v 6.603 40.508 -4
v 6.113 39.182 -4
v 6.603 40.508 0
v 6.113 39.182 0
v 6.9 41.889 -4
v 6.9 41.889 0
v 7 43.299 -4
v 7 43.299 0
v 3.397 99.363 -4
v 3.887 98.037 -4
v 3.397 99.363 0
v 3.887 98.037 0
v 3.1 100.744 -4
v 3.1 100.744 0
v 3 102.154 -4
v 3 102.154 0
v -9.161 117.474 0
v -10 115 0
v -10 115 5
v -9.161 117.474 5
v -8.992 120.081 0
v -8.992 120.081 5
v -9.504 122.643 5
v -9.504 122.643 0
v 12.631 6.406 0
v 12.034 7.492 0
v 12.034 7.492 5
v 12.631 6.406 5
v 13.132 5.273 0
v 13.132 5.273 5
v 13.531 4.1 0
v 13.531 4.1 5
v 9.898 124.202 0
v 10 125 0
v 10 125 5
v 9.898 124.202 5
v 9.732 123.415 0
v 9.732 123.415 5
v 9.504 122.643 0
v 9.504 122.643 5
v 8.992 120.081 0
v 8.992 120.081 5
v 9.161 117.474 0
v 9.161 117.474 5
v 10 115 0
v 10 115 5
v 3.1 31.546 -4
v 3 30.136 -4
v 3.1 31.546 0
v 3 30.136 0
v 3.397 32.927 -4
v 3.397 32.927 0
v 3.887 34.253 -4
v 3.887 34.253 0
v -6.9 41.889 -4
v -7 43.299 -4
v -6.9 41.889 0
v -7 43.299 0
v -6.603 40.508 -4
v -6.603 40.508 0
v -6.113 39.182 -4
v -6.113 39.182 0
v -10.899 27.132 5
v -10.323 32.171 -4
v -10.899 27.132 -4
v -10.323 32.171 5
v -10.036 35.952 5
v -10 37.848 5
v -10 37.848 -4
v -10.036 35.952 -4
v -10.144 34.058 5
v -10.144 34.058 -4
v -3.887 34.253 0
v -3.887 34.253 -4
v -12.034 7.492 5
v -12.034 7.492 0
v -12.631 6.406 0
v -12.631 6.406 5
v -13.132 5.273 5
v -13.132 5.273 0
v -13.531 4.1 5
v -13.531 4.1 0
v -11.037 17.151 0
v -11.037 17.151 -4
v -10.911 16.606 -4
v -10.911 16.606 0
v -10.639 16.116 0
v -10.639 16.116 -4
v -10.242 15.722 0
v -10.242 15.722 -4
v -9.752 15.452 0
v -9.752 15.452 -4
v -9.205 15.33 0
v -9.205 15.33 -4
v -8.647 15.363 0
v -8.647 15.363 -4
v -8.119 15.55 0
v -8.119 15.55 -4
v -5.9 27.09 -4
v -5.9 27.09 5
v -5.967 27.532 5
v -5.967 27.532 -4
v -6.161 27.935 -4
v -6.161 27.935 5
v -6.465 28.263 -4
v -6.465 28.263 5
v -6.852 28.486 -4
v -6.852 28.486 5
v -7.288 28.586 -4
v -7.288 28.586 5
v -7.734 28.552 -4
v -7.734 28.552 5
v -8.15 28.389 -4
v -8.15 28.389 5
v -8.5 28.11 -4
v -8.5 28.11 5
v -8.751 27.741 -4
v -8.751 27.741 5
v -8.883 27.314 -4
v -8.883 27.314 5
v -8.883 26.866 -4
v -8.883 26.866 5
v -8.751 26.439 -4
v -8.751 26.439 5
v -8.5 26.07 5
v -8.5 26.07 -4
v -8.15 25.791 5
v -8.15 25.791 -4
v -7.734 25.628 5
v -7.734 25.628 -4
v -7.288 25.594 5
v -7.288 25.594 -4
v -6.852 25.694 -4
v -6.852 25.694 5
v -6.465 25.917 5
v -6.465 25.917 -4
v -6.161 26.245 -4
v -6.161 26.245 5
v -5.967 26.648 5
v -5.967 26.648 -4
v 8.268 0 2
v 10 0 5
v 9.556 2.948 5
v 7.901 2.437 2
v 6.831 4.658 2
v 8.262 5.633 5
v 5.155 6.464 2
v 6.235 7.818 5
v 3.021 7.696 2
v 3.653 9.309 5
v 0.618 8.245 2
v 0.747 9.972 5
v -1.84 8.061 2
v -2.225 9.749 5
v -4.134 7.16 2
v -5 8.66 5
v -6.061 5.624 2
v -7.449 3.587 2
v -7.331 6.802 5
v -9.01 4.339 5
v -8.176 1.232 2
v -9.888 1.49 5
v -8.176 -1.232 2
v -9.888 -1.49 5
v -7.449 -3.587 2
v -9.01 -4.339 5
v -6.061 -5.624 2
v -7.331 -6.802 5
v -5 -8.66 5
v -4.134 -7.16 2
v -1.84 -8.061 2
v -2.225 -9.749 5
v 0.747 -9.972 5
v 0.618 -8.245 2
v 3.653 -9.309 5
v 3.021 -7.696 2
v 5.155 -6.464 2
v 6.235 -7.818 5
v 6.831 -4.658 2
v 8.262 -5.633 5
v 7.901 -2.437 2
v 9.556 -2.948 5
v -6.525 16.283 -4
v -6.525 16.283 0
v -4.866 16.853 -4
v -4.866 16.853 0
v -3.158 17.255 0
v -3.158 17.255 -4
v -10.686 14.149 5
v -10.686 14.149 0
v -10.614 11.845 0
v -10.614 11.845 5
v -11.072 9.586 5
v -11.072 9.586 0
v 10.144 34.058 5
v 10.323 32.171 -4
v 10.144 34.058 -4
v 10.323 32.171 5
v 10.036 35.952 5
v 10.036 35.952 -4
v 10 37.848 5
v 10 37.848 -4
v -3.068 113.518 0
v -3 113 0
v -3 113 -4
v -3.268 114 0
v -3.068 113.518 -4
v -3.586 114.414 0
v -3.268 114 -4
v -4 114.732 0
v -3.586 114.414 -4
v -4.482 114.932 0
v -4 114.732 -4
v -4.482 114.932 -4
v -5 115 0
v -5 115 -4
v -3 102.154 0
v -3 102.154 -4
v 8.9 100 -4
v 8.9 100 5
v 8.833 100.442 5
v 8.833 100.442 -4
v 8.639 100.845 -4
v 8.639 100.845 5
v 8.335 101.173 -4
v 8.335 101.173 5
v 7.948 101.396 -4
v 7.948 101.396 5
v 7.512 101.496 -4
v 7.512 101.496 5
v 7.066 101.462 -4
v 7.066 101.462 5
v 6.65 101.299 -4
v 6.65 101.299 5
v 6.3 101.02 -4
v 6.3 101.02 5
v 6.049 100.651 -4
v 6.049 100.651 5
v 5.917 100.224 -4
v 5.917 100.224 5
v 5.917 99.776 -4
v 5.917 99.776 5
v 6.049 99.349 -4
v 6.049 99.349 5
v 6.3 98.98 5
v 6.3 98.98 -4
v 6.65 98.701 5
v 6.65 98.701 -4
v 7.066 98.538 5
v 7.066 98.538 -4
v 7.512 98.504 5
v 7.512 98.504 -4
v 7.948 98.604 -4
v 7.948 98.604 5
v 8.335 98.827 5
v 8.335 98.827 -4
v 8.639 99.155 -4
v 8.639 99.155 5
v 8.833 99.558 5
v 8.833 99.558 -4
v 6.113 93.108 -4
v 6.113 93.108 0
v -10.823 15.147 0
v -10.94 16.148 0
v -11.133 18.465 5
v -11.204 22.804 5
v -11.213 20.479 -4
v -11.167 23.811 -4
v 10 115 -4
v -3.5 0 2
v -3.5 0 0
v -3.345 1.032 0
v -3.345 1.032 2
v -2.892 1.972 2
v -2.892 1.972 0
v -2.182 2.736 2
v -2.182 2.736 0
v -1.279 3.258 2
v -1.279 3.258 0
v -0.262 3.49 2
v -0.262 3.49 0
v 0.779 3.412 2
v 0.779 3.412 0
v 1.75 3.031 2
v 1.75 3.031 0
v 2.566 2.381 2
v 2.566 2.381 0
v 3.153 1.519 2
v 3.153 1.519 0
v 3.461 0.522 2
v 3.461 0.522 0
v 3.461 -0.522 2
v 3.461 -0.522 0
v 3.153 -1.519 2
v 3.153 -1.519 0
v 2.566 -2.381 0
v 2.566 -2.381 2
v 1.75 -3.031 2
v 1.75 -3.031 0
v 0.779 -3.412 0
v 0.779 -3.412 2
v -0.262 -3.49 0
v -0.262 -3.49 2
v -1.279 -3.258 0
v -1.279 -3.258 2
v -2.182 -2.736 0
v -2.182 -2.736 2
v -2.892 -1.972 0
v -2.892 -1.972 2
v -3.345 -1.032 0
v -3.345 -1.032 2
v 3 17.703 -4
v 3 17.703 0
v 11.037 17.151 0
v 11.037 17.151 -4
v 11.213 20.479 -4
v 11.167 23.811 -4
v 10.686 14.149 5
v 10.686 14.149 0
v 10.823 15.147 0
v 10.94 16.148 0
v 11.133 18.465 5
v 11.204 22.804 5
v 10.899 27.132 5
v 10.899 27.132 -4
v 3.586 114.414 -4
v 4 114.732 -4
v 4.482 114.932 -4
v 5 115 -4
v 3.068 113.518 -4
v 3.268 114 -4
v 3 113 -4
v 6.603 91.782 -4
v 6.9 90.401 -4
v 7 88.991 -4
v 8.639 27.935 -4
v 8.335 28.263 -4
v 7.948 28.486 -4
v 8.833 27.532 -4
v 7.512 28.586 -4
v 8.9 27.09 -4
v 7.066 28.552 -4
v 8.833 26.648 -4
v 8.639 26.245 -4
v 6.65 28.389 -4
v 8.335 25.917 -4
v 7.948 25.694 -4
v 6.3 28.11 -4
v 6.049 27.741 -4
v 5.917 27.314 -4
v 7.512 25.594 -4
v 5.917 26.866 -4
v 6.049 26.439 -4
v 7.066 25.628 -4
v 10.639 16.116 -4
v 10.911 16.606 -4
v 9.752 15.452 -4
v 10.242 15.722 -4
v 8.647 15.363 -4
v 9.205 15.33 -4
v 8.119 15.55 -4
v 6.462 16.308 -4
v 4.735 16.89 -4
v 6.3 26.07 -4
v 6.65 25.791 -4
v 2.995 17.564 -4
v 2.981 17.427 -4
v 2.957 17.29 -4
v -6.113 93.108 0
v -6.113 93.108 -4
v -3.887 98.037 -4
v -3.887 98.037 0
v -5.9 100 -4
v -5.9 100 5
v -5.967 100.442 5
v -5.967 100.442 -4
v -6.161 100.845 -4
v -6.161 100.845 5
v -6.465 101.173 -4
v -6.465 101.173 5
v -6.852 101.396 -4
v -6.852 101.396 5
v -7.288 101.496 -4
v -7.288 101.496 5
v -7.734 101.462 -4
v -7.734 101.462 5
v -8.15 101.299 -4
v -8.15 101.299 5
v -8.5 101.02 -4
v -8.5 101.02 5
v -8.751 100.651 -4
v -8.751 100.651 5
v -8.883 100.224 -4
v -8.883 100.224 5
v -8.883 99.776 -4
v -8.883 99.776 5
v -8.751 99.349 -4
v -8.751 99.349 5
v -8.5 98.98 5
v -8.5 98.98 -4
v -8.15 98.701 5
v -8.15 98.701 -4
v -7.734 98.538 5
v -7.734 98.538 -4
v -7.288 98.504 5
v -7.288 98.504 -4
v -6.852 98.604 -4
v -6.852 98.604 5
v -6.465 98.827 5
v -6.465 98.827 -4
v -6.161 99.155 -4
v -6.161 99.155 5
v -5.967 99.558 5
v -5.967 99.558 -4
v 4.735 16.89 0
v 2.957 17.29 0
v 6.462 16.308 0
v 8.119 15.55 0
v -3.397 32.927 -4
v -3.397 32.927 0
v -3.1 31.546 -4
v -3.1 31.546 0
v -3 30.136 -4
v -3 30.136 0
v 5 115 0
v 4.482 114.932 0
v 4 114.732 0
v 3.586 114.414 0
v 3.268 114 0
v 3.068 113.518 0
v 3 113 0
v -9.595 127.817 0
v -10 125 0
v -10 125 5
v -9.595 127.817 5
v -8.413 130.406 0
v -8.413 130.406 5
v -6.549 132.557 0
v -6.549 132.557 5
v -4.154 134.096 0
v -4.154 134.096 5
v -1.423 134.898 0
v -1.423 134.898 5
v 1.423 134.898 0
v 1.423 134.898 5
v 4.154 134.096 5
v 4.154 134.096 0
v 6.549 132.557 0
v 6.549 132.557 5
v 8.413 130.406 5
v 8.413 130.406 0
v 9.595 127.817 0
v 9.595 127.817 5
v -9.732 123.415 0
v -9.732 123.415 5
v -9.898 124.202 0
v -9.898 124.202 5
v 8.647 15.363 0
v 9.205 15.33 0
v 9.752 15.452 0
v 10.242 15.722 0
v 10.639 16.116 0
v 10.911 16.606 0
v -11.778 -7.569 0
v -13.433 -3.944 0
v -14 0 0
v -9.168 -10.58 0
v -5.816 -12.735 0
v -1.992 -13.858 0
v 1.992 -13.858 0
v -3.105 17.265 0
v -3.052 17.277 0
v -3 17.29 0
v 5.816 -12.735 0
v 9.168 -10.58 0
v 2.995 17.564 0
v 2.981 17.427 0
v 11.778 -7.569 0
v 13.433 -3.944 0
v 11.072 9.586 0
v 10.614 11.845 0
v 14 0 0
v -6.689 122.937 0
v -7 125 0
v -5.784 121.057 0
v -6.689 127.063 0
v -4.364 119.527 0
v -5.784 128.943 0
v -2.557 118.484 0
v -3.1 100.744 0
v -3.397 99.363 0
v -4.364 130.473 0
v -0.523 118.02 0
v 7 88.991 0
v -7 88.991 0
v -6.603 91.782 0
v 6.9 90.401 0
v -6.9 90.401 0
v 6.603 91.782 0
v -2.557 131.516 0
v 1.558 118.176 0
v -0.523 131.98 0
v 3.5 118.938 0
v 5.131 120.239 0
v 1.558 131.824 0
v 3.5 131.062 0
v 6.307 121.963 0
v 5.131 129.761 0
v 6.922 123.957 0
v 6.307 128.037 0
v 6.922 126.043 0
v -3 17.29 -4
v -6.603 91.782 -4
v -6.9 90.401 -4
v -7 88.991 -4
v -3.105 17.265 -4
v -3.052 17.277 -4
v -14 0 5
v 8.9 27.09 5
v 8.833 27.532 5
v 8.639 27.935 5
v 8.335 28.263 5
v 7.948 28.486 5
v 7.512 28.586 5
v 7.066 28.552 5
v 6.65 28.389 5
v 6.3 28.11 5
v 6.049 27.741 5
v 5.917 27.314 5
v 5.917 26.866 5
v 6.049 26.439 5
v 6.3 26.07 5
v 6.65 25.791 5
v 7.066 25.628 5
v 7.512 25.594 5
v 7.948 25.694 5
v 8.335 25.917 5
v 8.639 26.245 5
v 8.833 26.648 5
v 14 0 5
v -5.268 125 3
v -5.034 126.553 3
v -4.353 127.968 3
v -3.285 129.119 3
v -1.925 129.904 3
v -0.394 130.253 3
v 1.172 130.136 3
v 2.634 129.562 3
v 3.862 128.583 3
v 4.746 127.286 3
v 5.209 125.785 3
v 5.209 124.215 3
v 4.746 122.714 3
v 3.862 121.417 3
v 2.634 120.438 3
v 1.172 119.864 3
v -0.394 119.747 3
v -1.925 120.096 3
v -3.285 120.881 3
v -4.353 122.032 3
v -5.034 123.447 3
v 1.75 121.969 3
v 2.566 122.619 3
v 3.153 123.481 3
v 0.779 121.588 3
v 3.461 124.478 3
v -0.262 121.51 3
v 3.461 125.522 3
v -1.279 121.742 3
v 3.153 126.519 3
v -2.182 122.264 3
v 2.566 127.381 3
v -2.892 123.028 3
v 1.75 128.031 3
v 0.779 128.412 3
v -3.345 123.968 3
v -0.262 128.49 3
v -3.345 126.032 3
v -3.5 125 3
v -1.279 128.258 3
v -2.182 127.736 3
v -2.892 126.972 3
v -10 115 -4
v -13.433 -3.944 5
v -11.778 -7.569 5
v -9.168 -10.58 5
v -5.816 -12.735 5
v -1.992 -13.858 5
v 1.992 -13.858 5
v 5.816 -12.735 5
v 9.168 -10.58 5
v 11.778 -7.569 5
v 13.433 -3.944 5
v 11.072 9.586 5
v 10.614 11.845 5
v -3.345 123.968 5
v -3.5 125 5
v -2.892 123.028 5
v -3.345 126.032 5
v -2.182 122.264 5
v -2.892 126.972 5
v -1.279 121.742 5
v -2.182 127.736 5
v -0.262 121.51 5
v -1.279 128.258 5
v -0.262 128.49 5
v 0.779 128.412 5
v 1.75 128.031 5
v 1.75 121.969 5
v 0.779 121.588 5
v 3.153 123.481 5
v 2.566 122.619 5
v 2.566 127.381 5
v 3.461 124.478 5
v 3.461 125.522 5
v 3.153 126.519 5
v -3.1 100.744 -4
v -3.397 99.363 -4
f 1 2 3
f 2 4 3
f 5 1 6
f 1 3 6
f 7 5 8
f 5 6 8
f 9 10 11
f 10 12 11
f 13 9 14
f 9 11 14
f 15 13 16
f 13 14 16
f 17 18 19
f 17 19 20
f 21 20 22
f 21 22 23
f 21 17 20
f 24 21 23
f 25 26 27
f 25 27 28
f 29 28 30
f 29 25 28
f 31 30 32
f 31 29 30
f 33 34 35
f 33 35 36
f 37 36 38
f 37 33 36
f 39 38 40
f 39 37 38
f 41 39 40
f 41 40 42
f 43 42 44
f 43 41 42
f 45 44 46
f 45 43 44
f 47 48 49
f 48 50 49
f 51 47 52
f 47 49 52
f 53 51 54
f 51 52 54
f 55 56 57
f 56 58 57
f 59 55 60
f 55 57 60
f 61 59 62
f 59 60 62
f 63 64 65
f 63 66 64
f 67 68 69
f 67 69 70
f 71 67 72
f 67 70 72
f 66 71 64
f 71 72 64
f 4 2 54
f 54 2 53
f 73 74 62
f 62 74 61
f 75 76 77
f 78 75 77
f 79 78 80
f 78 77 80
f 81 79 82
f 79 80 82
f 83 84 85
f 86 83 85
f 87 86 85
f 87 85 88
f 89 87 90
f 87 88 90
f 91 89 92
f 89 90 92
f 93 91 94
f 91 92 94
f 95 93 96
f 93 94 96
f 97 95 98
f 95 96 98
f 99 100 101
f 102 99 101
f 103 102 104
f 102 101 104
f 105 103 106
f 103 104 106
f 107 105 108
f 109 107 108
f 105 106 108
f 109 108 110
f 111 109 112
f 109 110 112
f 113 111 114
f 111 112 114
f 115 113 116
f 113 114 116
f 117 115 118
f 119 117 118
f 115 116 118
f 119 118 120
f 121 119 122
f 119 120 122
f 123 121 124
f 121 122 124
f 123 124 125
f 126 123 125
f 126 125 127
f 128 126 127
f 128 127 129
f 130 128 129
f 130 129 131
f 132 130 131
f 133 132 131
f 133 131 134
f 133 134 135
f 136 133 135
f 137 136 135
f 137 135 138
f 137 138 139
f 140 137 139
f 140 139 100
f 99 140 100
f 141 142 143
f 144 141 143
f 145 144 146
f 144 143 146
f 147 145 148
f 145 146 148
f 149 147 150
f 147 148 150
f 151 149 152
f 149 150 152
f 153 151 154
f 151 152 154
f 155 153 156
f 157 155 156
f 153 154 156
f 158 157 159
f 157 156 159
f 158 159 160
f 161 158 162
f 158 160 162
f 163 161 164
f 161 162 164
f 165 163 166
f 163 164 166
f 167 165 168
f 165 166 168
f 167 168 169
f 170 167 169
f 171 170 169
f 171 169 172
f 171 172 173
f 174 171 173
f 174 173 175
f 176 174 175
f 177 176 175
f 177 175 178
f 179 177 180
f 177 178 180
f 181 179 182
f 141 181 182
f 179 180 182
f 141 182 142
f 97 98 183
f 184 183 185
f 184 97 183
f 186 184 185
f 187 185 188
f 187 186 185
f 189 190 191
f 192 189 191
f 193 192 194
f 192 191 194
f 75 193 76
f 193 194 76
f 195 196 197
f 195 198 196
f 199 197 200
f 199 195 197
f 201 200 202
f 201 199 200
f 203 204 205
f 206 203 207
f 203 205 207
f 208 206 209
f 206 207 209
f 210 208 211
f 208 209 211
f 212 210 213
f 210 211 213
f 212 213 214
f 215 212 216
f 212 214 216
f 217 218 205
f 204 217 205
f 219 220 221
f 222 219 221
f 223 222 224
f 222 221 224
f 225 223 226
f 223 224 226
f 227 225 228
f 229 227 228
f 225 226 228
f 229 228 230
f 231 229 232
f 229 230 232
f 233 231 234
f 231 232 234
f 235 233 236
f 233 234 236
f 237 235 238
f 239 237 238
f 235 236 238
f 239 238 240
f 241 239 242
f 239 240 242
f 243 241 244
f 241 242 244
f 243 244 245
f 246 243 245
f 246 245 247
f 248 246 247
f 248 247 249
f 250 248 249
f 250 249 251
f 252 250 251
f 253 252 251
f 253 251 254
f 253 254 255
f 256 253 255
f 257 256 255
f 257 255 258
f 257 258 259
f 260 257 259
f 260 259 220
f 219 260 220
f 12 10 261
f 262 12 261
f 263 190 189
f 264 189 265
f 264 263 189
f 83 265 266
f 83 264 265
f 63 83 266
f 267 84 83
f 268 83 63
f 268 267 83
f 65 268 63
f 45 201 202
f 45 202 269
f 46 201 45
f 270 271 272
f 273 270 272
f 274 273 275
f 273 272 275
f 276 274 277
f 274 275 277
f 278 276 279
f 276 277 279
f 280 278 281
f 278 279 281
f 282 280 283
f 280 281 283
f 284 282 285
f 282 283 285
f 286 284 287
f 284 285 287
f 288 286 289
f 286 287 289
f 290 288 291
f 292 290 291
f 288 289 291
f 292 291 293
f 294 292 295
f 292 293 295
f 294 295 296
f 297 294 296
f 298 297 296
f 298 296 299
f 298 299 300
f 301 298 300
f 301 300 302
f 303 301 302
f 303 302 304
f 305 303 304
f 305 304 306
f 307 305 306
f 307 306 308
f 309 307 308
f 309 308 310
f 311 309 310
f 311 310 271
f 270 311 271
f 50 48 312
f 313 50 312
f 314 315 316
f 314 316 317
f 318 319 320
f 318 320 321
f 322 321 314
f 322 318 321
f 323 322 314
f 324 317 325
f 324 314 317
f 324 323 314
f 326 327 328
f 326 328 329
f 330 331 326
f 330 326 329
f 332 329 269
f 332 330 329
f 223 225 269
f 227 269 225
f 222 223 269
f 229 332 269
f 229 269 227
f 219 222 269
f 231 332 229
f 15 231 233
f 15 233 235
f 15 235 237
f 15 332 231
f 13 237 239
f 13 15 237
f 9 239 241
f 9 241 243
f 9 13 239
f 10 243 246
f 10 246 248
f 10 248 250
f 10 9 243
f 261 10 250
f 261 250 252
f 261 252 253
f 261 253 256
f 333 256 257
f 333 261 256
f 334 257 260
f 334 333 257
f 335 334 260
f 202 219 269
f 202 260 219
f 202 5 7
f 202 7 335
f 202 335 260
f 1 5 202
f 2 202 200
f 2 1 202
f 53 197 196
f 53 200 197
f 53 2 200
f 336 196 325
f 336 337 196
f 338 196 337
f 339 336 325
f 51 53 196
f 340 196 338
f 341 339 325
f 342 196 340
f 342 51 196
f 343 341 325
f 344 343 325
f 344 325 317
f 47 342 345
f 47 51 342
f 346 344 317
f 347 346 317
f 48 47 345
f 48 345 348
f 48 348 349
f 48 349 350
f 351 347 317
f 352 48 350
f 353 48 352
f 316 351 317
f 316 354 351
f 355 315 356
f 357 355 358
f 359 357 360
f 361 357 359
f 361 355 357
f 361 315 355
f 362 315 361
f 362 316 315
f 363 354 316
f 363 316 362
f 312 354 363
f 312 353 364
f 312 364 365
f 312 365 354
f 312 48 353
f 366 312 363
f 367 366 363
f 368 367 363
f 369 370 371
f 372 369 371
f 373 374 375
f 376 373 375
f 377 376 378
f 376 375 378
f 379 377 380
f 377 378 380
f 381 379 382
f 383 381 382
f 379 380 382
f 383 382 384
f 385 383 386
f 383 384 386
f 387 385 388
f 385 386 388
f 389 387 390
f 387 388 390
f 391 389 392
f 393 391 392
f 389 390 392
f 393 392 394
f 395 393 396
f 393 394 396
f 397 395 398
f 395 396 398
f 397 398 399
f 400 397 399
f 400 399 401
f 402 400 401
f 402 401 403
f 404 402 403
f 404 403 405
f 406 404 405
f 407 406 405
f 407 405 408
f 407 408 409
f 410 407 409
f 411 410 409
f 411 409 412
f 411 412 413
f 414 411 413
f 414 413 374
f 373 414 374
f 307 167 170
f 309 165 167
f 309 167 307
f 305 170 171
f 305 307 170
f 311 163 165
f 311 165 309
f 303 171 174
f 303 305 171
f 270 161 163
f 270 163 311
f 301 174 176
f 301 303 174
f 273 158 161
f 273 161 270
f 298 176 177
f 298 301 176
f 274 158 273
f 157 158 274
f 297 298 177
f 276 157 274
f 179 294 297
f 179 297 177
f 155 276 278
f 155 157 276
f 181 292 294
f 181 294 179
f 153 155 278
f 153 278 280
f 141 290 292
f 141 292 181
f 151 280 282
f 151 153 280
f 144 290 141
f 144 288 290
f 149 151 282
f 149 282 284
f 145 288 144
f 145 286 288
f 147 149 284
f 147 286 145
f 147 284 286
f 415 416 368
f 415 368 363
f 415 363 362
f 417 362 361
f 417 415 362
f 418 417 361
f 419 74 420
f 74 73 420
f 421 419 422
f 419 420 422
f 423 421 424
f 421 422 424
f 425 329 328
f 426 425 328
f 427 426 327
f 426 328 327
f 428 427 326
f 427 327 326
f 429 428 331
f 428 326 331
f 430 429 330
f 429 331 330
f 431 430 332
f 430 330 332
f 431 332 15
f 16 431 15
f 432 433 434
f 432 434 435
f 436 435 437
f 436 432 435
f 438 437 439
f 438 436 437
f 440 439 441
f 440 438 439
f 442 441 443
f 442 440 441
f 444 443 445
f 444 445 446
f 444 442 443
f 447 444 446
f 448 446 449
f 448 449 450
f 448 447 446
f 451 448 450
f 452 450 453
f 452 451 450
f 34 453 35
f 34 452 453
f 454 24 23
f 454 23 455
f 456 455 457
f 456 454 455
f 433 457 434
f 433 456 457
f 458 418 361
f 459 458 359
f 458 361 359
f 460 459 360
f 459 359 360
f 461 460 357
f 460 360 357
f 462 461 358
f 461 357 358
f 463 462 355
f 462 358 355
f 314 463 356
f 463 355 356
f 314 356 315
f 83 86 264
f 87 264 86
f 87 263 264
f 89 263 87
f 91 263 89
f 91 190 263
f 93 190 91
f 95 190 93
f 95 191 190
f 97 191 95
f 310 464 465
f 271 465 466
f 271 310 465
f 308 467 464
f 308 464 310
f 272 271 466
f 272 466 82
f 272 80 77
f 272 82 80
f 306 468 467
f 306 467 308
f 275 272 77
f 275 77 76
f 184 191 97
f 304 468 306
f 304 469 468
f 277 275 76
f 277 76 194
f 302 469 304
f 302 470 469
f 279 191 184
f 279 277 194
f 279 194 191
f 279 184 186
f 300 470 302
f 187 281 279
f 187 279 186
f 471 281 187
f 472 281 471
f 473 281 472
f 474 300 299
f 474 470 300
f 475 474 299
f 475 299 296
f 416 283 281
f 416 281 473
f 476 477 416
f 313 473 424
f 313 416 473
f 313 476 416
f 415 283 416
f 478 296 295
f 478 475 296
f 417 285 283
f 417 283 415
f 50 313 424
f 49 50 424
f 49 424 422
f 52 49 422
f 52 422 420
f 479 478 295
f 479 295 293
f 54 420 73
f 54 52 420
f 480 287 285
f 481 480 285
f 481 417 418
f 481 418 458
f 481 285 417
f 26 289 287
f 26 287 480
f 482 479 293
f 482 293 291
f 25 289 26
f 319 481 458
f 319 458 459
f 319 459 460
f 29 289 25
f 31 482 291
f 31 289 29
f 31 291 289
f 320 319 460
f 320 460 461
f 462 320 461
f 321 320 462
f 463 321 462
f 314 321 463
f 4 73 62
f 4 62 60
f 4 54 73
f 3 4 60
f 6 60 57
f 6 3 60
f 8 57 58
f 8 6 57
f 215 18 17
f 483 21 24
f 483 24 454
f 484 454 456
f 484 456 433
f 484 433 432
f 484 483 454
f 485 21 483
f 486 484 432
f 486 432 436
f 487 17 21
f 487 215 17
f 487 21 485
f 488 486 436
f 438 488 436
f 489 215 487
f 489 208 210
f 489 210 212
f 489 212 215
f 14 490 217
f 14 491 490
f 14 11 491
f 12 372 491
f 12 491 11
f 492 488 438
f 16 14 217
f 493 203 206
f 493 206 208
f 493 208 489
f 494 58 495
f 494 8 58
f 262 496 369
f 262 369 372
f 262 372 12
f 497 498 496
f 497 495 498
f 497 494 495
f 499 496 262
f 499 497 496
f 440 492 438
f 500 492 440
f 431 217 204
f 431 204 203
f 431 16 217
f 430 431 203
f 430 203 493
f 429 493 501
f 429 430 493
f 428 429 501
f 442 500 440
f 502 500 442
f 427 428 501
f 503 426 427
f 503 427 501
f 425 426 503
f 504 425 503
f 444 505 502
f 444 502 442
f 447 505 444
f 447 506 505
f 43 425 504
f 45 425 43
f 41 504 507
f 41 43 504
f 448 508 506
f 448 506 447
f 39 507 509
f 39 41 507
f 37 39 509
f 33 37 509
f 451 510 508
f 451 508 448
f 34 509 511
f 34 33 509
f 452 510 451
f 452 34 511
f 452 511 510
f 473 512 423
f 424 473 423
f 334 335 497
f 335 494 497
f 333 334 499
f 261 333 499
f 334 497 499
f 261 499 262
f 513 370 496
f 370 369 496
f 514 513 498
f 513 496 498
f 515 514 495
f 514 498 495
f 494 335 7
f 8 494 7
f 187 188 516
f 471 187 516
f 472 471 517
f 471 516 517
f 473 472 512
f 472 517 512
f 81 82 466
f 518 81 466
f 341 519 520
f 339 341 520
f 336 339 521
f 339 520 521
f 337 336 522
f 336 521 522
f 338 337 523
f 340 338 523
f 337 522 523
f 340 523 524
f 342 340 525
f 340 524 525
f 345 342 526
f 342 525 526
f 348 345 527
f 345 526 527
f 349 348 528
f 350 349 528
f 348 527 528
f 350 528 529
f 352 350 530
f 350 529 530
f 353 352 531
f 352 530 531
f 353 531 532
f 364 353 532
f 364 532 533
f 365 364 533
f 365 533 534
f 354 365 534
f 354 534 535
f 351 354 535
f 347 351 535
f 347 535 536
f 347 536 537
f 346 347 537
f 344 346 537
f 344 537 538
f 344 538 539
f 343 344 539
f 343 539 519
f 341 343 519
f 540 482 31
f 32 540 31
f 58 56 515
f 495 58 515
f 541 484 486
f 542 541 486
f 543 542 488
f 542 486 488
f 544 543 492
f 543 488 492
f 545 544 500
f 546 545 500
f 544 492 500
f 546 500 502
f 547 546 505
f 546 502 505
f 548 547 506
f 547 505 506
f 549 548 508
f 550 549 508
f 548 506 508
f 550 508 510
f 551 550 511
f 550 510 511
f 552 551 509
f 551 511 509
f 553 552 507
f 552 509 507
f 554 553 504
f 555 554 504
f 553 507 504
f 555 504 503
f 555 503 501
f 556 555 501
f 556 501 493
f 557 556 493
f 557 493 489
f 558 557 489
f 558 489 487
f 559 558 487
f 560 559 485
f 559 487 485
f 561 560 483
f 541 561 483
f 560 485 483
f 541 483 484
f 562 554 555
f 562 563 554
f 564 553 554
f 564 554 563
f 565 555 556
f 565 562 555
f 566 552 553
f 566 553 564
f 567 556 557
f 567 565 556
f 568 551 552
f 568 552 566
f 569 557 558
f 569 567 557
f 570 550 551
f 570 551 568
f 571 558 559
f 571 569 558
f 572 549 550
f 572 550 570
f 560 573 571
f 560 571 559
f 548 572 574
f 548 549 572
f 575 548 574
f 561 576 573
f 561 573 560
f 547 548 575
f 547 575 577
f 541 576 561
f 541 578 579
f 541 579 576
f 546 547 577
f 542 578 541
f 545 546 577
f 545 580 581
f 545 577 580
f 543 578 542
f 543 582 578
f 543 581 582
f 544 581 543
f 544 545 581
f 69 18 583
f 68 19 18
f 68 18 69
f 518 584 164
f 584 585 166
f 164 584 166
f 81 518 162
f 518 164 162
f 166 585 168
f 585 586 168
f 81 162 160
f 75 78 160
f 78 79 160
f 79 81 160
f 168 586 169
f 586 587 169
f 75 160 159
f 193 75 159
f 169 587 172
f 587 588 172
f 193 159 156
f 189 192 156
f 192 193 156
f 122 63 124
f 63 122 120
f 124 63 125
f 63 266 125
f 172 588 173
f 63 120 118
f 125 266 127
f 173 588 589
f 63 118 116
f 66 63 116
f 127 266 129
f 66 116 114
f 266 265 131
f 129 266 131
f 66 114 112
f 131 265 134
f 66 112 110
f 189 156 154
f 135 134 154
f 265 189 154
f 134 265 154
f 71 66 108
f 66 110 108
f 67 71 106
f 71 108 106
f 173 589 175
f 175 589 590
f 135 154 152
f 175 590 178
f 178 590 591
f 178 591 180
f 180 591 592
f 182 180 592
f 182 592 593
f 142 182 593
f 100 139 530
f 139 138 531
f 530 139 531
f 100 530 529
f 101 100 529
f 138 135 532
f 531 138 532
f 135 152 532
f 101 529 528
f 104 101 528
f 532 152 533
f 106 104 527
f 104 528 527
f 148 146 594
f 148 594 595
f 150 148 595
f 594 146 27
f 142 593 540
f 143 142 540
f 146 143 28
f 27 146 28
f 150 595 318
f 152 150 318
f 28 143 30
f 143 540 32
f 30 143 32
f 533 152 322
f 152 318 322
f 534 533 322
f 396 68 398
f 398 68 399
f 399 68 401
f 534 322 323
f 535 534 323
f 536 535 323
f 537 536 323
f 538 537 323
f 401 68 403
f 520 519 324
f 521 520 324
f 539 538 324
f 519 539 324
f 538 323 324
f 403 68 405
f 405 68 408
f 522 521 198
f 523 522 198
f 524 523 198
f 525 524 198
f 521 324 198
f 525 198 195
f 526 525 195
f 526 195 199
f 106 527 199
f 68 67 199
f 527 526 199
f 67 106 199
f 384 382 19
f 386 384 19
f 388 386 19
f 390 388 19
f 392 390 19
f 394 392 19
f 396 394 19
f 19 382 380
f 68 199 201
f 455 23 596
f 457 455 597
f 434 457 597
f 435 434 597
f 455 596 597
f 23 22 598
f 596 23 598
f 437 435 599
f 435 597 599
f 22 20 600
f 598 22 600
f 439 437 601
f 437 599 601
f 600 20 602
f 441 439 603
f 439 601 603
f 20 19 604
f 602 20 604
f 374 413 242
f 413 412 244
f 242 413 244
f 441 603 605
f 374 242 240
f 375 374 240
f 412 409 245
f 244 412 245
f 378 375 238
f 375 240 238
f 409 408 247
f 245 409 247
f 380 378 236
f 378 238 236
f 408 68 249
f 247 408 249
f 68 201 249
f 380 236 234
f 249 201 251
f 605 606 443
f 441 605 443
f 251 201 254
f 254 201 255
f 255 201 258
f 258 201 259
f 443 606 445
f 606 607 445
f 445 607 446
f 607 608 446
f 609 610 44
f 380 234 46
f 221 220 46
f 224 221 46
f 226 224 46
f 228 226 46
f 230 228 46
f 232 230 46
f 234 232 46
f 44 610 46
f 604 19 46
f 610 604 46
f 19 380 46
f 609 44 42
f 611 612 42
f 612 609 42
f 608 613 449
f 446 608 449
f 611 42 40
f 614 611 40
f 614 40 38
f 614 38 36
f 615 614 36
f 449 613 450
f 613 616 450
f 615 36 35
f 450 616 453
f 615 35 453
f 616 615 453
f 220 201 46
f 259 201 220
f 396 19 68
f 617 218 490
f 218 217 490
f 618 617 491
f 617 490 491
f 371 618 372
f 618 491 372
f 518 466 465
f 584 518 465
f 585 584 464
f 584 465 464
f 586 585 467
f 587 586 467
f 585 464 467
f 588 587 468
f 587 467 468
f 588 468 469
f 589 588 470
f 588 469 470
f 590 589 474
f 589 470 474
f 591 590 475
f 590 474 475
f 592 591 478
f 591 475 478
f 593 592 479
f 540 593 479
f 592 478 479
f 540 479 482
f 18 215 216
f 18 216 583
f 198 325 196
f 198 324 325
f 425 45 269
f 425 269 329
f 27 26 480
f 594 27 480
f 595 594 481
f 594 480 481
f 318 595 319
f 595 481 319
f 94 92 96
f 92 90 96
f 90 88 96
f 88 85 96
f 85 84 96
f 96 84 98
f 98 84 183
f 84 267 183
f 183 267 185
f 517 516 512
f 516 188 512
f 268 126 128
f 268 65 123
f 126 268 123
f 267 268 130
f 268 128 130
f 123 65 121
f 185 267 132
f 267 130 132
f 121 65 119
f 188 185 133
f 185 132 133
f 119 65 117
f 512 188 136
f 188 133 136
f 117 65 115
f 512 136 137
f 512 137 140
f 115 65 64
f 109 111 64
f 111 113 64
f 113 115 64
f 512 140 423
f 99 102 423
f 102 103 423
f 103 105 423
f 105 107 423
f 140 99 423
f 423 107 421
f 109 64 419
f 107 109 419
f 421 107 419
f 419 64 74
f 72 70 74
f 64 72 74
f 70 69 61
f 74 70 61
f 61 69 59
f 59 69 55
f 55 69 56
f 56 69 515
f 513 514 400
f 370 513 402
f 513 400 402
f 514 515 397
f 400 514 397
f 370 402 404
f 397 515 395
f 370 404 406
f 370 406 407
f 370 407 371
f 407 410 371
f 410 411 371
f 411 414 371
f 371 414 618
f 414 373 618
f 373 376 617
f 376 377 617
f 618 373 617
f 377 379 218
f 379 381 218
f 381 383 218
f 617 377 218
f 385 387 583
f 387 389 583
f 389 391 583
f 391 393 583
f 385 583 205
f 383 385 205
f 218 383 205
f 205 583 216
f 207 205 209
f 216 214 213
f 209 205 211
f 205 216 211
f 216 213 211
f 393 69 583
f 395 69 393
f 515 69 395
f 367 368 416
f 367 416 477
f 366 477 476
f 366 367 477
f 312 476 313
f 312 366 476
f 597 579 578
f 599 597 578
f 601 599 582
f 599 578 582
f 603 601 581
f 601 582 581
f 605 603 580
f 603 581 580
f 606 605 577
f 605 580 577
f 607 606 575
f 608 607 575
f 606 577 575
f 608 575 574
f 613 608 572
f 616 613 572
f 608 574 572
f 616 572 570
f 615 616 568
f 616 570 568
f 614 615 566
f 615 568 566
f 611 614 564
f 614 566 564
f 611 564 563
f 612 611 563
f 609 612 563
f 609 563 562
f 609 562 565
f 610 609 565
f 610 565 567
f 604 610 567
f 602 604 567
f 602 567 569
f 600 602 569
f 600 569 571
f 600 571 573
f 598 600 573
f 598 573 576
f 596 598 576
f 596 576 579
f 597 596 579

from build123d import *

# Parameters (mm, degrees)
BOSS_EXTRUDE1_DEPTH = 5
SKETCH2_W           = 20
SKETCH2_H           = 90.00000000000001
BOSS_EXTRUDE2_DEPTH = 5
CUT_EXTRUDE1_DEPTH  = 5
BOSS_EXTRUDE3_DEPTH = 4
SKETCH5_R           = 3.4999999999999996
CUT_EXTRUDE2_DEPTH  = 32
SKETCH6_R           = 10
CUT_EXTRUDE3_DEPTH  = 3
CUT_EXTRUDE3_DRAFT  = -30.000000000000068
SKETCH7_R           = 1.5
SKETCH7_R_2         = 1.5000000000000018
SKETCH7_R_3         = 1.5000000000000009
CUT_EXTRUDE4_DEPTH  = 127.10313239567049
CUT_EXTRUDE5_DEPTH  = 4
FILLET1_R           = 10
FILLET2_R           = 2
FILLET3_R           = 50
FILLET4_DEPTH       = 5
FILLET4_START       = -4
FILLET4_2_DEPTH     = 4.5281
FILLET5_R           = 2
SKETCH9_R           = 10.000000000000004
BOSS_EXTRUDE4_DEPTH = 5
CUT_EXTRUDE6_DEPTH  = 136.81605207043827
FILLET6_R           = 10
SKETCH12_R          = 7.000000000000002
CUT_EXTRUDE7_DEPTH  = 3
CUT_EXTRUDE7_DRAFT  = -30.000000000000068
SKETCH13_R          = 3.500000000000001
CUT_EXTRUDE8_DEPTH  = 136.90437814875574


with BuildPart() as part:
    # Sketch1 → Boss-Extrude1 (new body)
    with BuildSketch(Plane.XY):
        with BuildLine():
            Line((-10, 35), (-14, 0))
            ThreePointArc((-14.000000000000004, 0), (5.36e-15, -14.000000000000002), (14.000000000000007, 5.39e-15))
            Line((14, 0), (13.639000805801773, 3.1587429492344796))
            Line((13.639000805801773, 3.1587429492344796), (10, 35))
            Line((10, 35), (-10, 35))
        make_face()
    extrude(amount=BOSS_EXTRUDE1_DEPTH)

    # Sketch2 → Boss-Extrude2 (add)
    with BuildSketch(Plane.XY.offset(5)):
        with Locations((-8.9e-16, 80)):
            Rectangle(SKETCH2_W, SKETCH2_H)
    extrude(amount=-BOSS_EXTRUDE2_DEPTH)

    # Sketch3 → Cut-Extrude1 (cut)
    with BuildSketch(Plane(origin=(0, 0, 0), x_dir=(-1, 0, 0), z_dir=(0, 0, -1))):
        with BuildLine():
            Line((-13.531428571428568, 4.1), (-11.714285714285717, 20.000000000000004))
            Line((-11.714285714285717, 20.000000000000004), (-10, 10.097287013661564))
            ThreePointArc((-10, 10.097287013661564), (-12.138289126679721, 7.318029611811854), (-13.531428571428568, 4.1))
        make_face()
        with BuildLine():
            Line((11.714285714285717, 20.000000000000004), (10, 10.097287013661564))
            ThreePointArc((10, 10.097287013661564), (12.13828912667972, 7.318029611811857), (13.531428571428568, 4.1))
            Line((13.531428571428568, 4.1), (11.714285714285717, 20.000000000000004))
        make_face()
    extrude(amount=-CUT_EXTRUDE1_DEPTH, mode=Mode.SUBTRACT)

    # Sketch4 → Boss-Extrude3 (add)
    with BuildSketch(Plane(origin=(0, 0, 0), x_dir=(-1, 0, 0), z_dir=(0, 0, -1))):
        with BuildLine():
            Line((11.714285714285715, 20.000000000000007), (10.663491421845874, 13.93))
            ThreePointArc((10.663491421845874, 13.93), (1.07e-15, 17.541117308183576), (-10.663491421845876, 13.93))
            Line((-10.663491421845876, 13.93), (-11.714285714285717, 20.000000000000004))
            Line((-11.714285714285717, 20.000000000000004), (-10, 35))
            Line((-10, 35), (-9.999999999999998, 115))
            Line((-9.999999999999998, 115), (9.999999999999986, 115))
            Line((9.999999999999986, 115), (10.000000000000002, 35))
            Line((10.000000000000002, 35), (11.714285714285715, 20.000000000000007))
        make_face()
    extrude(amount=BOSS_EXTRUDE3_DEPTH)

    # Sketch5 → Cut-Extrude2 (cut)
    with BuildSketch(Plane(origin=(0, 0, 0), x_dir=(-1, 0, 0), z_dir=(0, 0, -1))):
        Circle(SKETCH5_R)
    extrude(amount=-CUT_EXTRUDE2_DEPTH, mode=Mode.SUBTRACT)


with BuildPart() as cut_extrude3_tool:
    # Sketch6 → Cut-Extrude3 (with draft: the straight prism first)
    with BuildSketch(Plane.XY.offset(5)):
        Circle(SKETCH6_R)
    extrude(amount=-CUT_EXTRUDE3_DEPTH)
    # Cut-Extrude3: the draft: its side faces are tilted about the plane it starts from
    cut_extrude3_sides = [cut_extrude3_tool.faces().sort_by_distance(p)[0] for p in [
        (-10, 0, 3.5),
    ]]
    draft(cut_extrude3_sides, Plane.XY.offset(5), CUT_EXTRUDE3_DRAFT)


with BuildPart() as part_1:
    add(part.part)

    # Cut-Extrude3: cut by cut_extrude3_tool
    add(cut_extrude3_tool.part, mode=Mode.SUBTRACT)

    # Sketch7 → Cut-Extrude4 (cut, through all)
    with BuildSketch(Plane.XY.offset(5)):
        with Locations((-7.40000000000001, 27.090000000000003)):
            Circle(SKETCH7_R)
        with Locations((7.40000000000001, 27.090000000000003)):
            Circle(SKETCH7_R_2)
        with Locations((-7.4, 100)):
            Circle(SKETCH7_R)
        with Locations((7.4, 100)):
            Circle(SKETCH7_R_3)
    extrude(amount=-CUT_EXTRUDE4_DEPTH, mode=Mode.SUBTRACT)

    # Sketch8 → Cut-Extrude5 (cut)
    with BuildSketch(Plane(origin=(0, 0, -4), x_dir=(-1, 0, 0), z_dir=(0, 0, -1))):
        Polygon((3.0000000000000036, 115), (-3, 115), (-2.999999999999998, 100), (-6.999999999999996, 91.14510297951342), (-6.999999999999996, 41.14510297951343), (-2.999999999999998, 32.29020595902685), (-3, 17.290205959026846), (3.000000000000001, 17.290205959026846), (2.9999999999999987, 32.29020595902685), (6.999999999999997, 41.14510297951343), (6.999999999999999, 91.14510297951342), (3.0000000000000004, 100), align=None)
    extrude(amount=-CUT_EXTRUDE5_DEPTH, mode=Mode.SUBTRACT)

    # Fillet1
    fillet1_edges = [part_1.edges().sort_by_distance(p)[0] for p in [
        (2.999999999999998, 32.29020595902685, -2),
        (6.999999999999996, 41.14510297951343, -2),
        (6.999999999999996, 91.14510297951342, -2),
        (2.999999999999998, 100, -2),
        (-3.0000000000000004, 100, -2),
        (-6.999999999999999, 91.14510297951342, -2),
        (-6.999999999999997, 41.14510297951343, -2),
        (-2.9999999999999987, 32.29020595902685, -2),
    ]]
    fillet(fillet1_edges, radius=FILLET1_R)

    # Fillet2
    # the kernel refuses this fillet: 2 mm, written as the material it adds along each edge
    with BuildSketch(Plane(origin=(3, 17.290205959026846, -4), x_dir=(0, 1, 0), z_dir=(0, 0, 1))) as fillet2_piece_1:
        with BuildLine():
            CenterArc((0.4123469241082738, 2), FILLET2_R, 258.1017989738068, 11.898201026193192)
            Line((-3.55e-15, 0.0429690819564339), (0, 0))
            Line((0, 0), (0.4123469241082738, 0))
        make_face()
    extrude(amount=5.0308673102706845)
    # the kernel refuses this fillet: 2 mm, written as the material it takes off along each edge
    with BuildSketch(Plane(origin=(-2.957030918043564, 17.290205959026842, -4.509899036073291), x_dir=(-0.9847073408131305, -0.17421668389891107, 0), z_dir=(0, 0, 1))) as fillet2_2_piece_1:
        with BuildLine():
            CenterArc((0.21558124488116945, -1.9999662341413758), FILLET2_R, 90.33293706162901, 4.637092426226772)
            Line((0.04231197043050394, -0.00748593096863449), (0, 0))
            ThreePointArc((0, 0), (0.10197980721465859, -0.00029629540941332), (0.20395961442931643, 0))
        make_face()
    extrude(amount=4.509899036073291, mode=Mode.SUBTRACT)
    with BuildSketch(Plane(origin=(-3.0000000000000036, 115, -9), x_dir=(0, -1, 0), z_dir=(0, 0, 1))) as fillet2_2_piece_2:
        with BuildLine():
            CenterArc((FILLET2_R, -FILLET2_R), FILLET2_R, 90, 89.99999999999994)
            Line((0, -FILLET2_R), (0, 0))
            Line((0, 0), (FILLET2_R, 0))
        make_face()
    extrude(amount=9, mode=Mode.SUBTRACT)
    with BuildSketch(Plane(origin=(3, 115, -9), x_dir=(1, 0, 0), z_dir=(0, 0, 1))) as fillet2_2_piece_3:
        with BuildLine():
            CenterArc((FILLET2_R, -FILLET2_R), FILLET2_R, 90, 90)
            Line((0, -FILLET2_R), (0, 0))
            Line((0, 0), (FILLET2_R, 0))
        make_face()
    extrude(amount=9, mode=Mode.SUBTRACT)

    # Fillet3
    fillet3_edges = [part_1.edges().sort_by_distance(p)[0] for p in [
        (10, 35, 0.5),
        (-10, 35, 0.5),
        (-11.714285714285715, 20.000000000000007, 0.5),
        (11.714285714285717, 20.000000000000004, 0.5),
    ]]
    fillet(fillet3_edges, radius=FILLET3_R)

    # Fillet4: read off the stored shape, not the designer's step
    # Fillet4 outline → Fillet4 (add)
    with BuildSketch(Plane.XY):
        with BuildLine():
            ThreePointArc((-12.034442383, 7.491554566), (-11.093201481, 8.85374289), (-10, 10.097287014))
            Line((-10, 10.097287014), (-10.489743981, 12.926333563))
            ThreePointArc((-10.489743981, 12.926333563), (-10.591568808, 13.537003207), (-10.685824653, 14.148886811))
            ThreePointArc((-10.685824653, 14.148886811), (-10.777565635, 10.702206243), (-12.034442383, 7.491554566))
        make_face()
        with BuildLine():
            ThreePointArc((10.685824653, 14.148886811), (10.591568808, 13.537003207), (10.489743981, 12.926333563))
            Line((10.489743981, 12.926333563), (10, 10.097287014))
            ThreePointArc((10, 10.097287014), (11.093201481, 8.85374289), (12.034442383, 7.491554566))
            ThreePointArc((12.034442383, 7.491554566), (10.777565635, 10.702206243), (10.685824653, 14.148886811))
        make_face()
    extrude(amount=FILLET4_DEPTH)

    # Fillet4 2 outline → Fillet4 2 (add)
    with BuildSketch(Plane.XY.offset(FILLET4_START)):
        with BuildLine():
            ThreePointArc((-10.685824653, 14.148886811), (-10.670645953, 14.042149596), (-10.656618864, 13.935254943))
            ThreePointArc((-10.656618864, 13.935254943), (-10.655355047, 13.936220708), (-10.654091142, 13.937186359))
            ThreePointArc((-10.654091142, 13.937186359), (-10.670071192, 14.043019602), (-10.685824653, 14.148886811))
        make_face()
        with BuildLine():
            ThreePointArc((10.656618864, 13.935254943), (10.670645953, 14.042149596), (10.685824653, 14.148886811))
            ThreePointArc((10.685824653, 14.148886811), (10.670071192, 14.043019602), (10.654091141, 13.937186358))
            ThreePointArc((10.654091141, 13.937186358), (10.655355047, 13.936220708), (10.656618864, 13.935254943))
        make_face()
    extrude(amount=FILLET4_2_DEPTH)

    # Fillet5
    # the kernel refuses this fillet: 2 mm, written as the material it takes off along each edge
    with BuildSketch(Plane(origin=(-10.656618864, 13.935254943, -12.09556862181672), x_dir=(0.8436487743277257, 0.5368954698778211, 0), z_dir=(0, 0, 1))) as fillet5_piece_1:
        with BuildLine():
            CenterArc((3.1791827490453266, 1.9926433067767657), FILLET5_R, 152.46563486341088, 112.61853158765763)
            Line((1.4057153013326045, 2.9172043982700875), (1.2283685565613318, 3.0096605074194187))
            ThreePointArc((1.2283685565613318, 3.0096605074194187), (-0.09255081820002803, 0.2774816540598466), (-0.1808082004145864, 0.08548914938656571))
            Line((-0.1808082004145864, 0.08548914938656571), (0.01713850646766271, -0.19926432594937338))
            ThreePointArc((0.01713850646766271, -0.19926432594937338), (0.02027181051916814, -0.198995120599251), (2.990659782622436, -0.1992643306776759))
            Line((2.990659782622436, -0.1992643306776759), (3.0077982341154264, -1.7e-16))
        make_face()
    extrude(amount=12.09556862181672, mode=Mode.SUBTRACT)
    with BuildSketch(Plane(origin=(10.656618863999999, 13.935254943, -12.095568621816739), x_dir=(-0.8436487743277254, 0.5368954698778213, 0), z_dir=(0, 0, 1))) as fillet5_piece_2:
        with BuildLine():
            CenterArc((3.179182749045327, -1.9926433067767648), FILLET5_R, 94.91583354893154, 112.61853158765777)
            Line((1.4057153013326076, -2.9172043982700937), (1.228368556561337, -3.009660507419428))
            ThreePointArc((1.228368556561337, -3.009660507419428), (-0.09255081820002496, -0.2774816540598447), (-0.18080820041458637, -0.08548914938656577))
            Line((-0.18080820041458637, -0.08548914938656577), (0.01713859427019769, 0.19926431839755343))
            ThreePointArc((0.01713859427019769, 0.19926431839755343), (0.02027181051918035, 0.19899512059924826), (2.9906597826224344, 0.199264330677676))
            Line((2.9906597826224344, 0.199264330677676), (3.007798234115425, 9e-17))
        make_face()
    extrude(amount=12.095568621816739, mode=Mode.SUBTRACT)

    # Sketch9 → Boss-Extrude4 (add)
    with BuildSketch(Plane(origin=(0, 0, 0), x_dir=(-1, 0, 0), z_dir=(0, 0, -1))):
        with Locations((1.73e-15, 125)):
            Circle(SKETCH9_R)
    extrude(amount=-BOSS_EXTRUDE4_DEPTH)

    # Sketch11 → Cut-Extrude6 (cut, through all)
    with BuildSketch(Plane(origin=(0, 0, 0), x_dir=(-1, 0, 0), z_dir=(0, 0, -1))):
        with BuildLine():
            Line((-9.999999999999998, 115), (-10.000000000000002, 125))
            ThreePointArc((-10.000000000000002, 125), (-9.21839383454114, 121.90275741168345), (-7.499999999999998, 119.21000000000001))
            Line((-7.499999999999998, 119.21000000000001), (-9.999999999999998, 115))
        make_face()
        with BuildLine():
            Line((10.000000000000002, 115), (7.5000000000000036, 119.21000000000001))
            ThreePointArc((7.5000000000000036, 119.21000000000001), (9.218393834541143, 121.90275741168345), (10.000000000000005, 125))
            Line((10.000000000000005, 125), (10.000000000000002, 115))
        make_face()
    extrude(amount=-CUT_EXTRUDE6_DEPTH, mode=Mode.SUBTRACT)

    # Fillet6
    # the kernel refuses this fillet: 10 mm, written as the material it adds along each edge
    with BuildSketch(Plane(origin=(7.499999999999999, 119.21000000000001, 0), x_dir=(0.5105859411129599, -0.859826724833436, 0), z_dir=(0, 0, 1))) as fillet6_piece_1:
        with BuildLine():
            CenterArc((5.675884841968563, 9.96956882778365), FILLET6_R, 220.4927276915396, 45.036246603568316)
            Line((-1.928999069434184, 3.476053547591599), (-2.081096747662235, 3.3461832419877546))
            ThreePointArc((-2.081096747662235, 3.3461832419877546), (-0.9649011887903164, 1.7378038801254725), (-0.19067765961673533, -0.06034923465201128))
            Line((-0.19067765961673533, -0.06034923465201128), (-8.127e-14, -0.19999999999999948))
            ThreePointArc((-8.127e-14, -0.19999999999999948), (2.4481676821655842, -0.2000000000009927), (4.88074437477858, -0.19939137655567607))
            Line((4.88074437477858, -0.19939137655567607), (4.89633536433132, 7e-17))
        make_face()
    extrude(amount=5)
    with BuildSketch(Plane(origin=(-7.500000000000004, 119.21000000000001, 0), x_dir=(-0.510585941112954, -0.8598267248334394, 0), z_dir=(0, 0, 1))) as fillet6_piece_2:
        with BuildLine():
            CenterArc((5.675884841968524, -9.969568827783654), FILLET6_R, 94.47102570489186, 45.036246603568216)
            Line((-1.928999069434189, -3.4760535475915604), (-2.081096747662239, -3.3461832419877147))
            ThreePointArc((-2.081096747662239, -3.3461832419877147), (-0.9649011887903213, -1.7378038801254492), (-0.19067765961673488, 0.06034923465201256))
            Line((-0.19067765961673488, 0.06034923465201256), (-7.992e-14, 0.19999999999999946))
            ThreePointArc((-7.992e-14, 0.19999999999999946), (2.448167682165587, 0.20000000000097304), (4.880744374778577, 0.19939137655567624))
            Line((4.880744374778577, 0.19939137655567624), (4.896335364331317, 1.8e-16))
        make_face()
    extrude(amount=5)


with BuildPart() as cut_extrude7_tool:
    # Sketch12 → Cut-Extrude7 (with draft: the straight prism first)
    with BuildSketch(Plane(origin=(0, 0, 0), x_dir=(-1, 0, 0), z_dir=(0, 0, -1))):
        with Locations((1.73e-15, 125)):
            Circle(SKETCH12_R)
    extrude(amount=-CUT_EXTRUDE7_DEPTH)
    # Cut-Extrude7: the draft: its side faces are tilted about the plane it starts from
    cut_extrude7_sides = [cut_extrude7_tool.faces().sort_by_distance(p)[0] for p in [
        (7, 125, 1.5),
    ]]
    draft(cut_extrude7_sides, Plane(origin=(0, 0, 0), x_dir=(-1, 0, 0), z_dir=(0, 0, -1)), CUT_EXTRUDE7_DRAFT)


with BuildPart() as part_2:
    add(part_1.part)

    # Cut-Extrude7: cut by cut_extrude7_tool
    add(cut_extrude7_tool.part, mode=Mode.SUBTRACT)

    # Sketch13 → Cut-Extrude8 (cut, through all)
    with BuildSketch(Plane(origin=(0, 0, 3), x_dir=(-1, 0, 0), z_dir=(0, 0, -1))):
        with Locations((1.73e-15, 125)):
            Circle(SKETCH13_R)
    extrude(amount=-CUT_EXTRUDE8_DEPTH, mode=Mode.SUBTRACT)


solid = part_2.part
